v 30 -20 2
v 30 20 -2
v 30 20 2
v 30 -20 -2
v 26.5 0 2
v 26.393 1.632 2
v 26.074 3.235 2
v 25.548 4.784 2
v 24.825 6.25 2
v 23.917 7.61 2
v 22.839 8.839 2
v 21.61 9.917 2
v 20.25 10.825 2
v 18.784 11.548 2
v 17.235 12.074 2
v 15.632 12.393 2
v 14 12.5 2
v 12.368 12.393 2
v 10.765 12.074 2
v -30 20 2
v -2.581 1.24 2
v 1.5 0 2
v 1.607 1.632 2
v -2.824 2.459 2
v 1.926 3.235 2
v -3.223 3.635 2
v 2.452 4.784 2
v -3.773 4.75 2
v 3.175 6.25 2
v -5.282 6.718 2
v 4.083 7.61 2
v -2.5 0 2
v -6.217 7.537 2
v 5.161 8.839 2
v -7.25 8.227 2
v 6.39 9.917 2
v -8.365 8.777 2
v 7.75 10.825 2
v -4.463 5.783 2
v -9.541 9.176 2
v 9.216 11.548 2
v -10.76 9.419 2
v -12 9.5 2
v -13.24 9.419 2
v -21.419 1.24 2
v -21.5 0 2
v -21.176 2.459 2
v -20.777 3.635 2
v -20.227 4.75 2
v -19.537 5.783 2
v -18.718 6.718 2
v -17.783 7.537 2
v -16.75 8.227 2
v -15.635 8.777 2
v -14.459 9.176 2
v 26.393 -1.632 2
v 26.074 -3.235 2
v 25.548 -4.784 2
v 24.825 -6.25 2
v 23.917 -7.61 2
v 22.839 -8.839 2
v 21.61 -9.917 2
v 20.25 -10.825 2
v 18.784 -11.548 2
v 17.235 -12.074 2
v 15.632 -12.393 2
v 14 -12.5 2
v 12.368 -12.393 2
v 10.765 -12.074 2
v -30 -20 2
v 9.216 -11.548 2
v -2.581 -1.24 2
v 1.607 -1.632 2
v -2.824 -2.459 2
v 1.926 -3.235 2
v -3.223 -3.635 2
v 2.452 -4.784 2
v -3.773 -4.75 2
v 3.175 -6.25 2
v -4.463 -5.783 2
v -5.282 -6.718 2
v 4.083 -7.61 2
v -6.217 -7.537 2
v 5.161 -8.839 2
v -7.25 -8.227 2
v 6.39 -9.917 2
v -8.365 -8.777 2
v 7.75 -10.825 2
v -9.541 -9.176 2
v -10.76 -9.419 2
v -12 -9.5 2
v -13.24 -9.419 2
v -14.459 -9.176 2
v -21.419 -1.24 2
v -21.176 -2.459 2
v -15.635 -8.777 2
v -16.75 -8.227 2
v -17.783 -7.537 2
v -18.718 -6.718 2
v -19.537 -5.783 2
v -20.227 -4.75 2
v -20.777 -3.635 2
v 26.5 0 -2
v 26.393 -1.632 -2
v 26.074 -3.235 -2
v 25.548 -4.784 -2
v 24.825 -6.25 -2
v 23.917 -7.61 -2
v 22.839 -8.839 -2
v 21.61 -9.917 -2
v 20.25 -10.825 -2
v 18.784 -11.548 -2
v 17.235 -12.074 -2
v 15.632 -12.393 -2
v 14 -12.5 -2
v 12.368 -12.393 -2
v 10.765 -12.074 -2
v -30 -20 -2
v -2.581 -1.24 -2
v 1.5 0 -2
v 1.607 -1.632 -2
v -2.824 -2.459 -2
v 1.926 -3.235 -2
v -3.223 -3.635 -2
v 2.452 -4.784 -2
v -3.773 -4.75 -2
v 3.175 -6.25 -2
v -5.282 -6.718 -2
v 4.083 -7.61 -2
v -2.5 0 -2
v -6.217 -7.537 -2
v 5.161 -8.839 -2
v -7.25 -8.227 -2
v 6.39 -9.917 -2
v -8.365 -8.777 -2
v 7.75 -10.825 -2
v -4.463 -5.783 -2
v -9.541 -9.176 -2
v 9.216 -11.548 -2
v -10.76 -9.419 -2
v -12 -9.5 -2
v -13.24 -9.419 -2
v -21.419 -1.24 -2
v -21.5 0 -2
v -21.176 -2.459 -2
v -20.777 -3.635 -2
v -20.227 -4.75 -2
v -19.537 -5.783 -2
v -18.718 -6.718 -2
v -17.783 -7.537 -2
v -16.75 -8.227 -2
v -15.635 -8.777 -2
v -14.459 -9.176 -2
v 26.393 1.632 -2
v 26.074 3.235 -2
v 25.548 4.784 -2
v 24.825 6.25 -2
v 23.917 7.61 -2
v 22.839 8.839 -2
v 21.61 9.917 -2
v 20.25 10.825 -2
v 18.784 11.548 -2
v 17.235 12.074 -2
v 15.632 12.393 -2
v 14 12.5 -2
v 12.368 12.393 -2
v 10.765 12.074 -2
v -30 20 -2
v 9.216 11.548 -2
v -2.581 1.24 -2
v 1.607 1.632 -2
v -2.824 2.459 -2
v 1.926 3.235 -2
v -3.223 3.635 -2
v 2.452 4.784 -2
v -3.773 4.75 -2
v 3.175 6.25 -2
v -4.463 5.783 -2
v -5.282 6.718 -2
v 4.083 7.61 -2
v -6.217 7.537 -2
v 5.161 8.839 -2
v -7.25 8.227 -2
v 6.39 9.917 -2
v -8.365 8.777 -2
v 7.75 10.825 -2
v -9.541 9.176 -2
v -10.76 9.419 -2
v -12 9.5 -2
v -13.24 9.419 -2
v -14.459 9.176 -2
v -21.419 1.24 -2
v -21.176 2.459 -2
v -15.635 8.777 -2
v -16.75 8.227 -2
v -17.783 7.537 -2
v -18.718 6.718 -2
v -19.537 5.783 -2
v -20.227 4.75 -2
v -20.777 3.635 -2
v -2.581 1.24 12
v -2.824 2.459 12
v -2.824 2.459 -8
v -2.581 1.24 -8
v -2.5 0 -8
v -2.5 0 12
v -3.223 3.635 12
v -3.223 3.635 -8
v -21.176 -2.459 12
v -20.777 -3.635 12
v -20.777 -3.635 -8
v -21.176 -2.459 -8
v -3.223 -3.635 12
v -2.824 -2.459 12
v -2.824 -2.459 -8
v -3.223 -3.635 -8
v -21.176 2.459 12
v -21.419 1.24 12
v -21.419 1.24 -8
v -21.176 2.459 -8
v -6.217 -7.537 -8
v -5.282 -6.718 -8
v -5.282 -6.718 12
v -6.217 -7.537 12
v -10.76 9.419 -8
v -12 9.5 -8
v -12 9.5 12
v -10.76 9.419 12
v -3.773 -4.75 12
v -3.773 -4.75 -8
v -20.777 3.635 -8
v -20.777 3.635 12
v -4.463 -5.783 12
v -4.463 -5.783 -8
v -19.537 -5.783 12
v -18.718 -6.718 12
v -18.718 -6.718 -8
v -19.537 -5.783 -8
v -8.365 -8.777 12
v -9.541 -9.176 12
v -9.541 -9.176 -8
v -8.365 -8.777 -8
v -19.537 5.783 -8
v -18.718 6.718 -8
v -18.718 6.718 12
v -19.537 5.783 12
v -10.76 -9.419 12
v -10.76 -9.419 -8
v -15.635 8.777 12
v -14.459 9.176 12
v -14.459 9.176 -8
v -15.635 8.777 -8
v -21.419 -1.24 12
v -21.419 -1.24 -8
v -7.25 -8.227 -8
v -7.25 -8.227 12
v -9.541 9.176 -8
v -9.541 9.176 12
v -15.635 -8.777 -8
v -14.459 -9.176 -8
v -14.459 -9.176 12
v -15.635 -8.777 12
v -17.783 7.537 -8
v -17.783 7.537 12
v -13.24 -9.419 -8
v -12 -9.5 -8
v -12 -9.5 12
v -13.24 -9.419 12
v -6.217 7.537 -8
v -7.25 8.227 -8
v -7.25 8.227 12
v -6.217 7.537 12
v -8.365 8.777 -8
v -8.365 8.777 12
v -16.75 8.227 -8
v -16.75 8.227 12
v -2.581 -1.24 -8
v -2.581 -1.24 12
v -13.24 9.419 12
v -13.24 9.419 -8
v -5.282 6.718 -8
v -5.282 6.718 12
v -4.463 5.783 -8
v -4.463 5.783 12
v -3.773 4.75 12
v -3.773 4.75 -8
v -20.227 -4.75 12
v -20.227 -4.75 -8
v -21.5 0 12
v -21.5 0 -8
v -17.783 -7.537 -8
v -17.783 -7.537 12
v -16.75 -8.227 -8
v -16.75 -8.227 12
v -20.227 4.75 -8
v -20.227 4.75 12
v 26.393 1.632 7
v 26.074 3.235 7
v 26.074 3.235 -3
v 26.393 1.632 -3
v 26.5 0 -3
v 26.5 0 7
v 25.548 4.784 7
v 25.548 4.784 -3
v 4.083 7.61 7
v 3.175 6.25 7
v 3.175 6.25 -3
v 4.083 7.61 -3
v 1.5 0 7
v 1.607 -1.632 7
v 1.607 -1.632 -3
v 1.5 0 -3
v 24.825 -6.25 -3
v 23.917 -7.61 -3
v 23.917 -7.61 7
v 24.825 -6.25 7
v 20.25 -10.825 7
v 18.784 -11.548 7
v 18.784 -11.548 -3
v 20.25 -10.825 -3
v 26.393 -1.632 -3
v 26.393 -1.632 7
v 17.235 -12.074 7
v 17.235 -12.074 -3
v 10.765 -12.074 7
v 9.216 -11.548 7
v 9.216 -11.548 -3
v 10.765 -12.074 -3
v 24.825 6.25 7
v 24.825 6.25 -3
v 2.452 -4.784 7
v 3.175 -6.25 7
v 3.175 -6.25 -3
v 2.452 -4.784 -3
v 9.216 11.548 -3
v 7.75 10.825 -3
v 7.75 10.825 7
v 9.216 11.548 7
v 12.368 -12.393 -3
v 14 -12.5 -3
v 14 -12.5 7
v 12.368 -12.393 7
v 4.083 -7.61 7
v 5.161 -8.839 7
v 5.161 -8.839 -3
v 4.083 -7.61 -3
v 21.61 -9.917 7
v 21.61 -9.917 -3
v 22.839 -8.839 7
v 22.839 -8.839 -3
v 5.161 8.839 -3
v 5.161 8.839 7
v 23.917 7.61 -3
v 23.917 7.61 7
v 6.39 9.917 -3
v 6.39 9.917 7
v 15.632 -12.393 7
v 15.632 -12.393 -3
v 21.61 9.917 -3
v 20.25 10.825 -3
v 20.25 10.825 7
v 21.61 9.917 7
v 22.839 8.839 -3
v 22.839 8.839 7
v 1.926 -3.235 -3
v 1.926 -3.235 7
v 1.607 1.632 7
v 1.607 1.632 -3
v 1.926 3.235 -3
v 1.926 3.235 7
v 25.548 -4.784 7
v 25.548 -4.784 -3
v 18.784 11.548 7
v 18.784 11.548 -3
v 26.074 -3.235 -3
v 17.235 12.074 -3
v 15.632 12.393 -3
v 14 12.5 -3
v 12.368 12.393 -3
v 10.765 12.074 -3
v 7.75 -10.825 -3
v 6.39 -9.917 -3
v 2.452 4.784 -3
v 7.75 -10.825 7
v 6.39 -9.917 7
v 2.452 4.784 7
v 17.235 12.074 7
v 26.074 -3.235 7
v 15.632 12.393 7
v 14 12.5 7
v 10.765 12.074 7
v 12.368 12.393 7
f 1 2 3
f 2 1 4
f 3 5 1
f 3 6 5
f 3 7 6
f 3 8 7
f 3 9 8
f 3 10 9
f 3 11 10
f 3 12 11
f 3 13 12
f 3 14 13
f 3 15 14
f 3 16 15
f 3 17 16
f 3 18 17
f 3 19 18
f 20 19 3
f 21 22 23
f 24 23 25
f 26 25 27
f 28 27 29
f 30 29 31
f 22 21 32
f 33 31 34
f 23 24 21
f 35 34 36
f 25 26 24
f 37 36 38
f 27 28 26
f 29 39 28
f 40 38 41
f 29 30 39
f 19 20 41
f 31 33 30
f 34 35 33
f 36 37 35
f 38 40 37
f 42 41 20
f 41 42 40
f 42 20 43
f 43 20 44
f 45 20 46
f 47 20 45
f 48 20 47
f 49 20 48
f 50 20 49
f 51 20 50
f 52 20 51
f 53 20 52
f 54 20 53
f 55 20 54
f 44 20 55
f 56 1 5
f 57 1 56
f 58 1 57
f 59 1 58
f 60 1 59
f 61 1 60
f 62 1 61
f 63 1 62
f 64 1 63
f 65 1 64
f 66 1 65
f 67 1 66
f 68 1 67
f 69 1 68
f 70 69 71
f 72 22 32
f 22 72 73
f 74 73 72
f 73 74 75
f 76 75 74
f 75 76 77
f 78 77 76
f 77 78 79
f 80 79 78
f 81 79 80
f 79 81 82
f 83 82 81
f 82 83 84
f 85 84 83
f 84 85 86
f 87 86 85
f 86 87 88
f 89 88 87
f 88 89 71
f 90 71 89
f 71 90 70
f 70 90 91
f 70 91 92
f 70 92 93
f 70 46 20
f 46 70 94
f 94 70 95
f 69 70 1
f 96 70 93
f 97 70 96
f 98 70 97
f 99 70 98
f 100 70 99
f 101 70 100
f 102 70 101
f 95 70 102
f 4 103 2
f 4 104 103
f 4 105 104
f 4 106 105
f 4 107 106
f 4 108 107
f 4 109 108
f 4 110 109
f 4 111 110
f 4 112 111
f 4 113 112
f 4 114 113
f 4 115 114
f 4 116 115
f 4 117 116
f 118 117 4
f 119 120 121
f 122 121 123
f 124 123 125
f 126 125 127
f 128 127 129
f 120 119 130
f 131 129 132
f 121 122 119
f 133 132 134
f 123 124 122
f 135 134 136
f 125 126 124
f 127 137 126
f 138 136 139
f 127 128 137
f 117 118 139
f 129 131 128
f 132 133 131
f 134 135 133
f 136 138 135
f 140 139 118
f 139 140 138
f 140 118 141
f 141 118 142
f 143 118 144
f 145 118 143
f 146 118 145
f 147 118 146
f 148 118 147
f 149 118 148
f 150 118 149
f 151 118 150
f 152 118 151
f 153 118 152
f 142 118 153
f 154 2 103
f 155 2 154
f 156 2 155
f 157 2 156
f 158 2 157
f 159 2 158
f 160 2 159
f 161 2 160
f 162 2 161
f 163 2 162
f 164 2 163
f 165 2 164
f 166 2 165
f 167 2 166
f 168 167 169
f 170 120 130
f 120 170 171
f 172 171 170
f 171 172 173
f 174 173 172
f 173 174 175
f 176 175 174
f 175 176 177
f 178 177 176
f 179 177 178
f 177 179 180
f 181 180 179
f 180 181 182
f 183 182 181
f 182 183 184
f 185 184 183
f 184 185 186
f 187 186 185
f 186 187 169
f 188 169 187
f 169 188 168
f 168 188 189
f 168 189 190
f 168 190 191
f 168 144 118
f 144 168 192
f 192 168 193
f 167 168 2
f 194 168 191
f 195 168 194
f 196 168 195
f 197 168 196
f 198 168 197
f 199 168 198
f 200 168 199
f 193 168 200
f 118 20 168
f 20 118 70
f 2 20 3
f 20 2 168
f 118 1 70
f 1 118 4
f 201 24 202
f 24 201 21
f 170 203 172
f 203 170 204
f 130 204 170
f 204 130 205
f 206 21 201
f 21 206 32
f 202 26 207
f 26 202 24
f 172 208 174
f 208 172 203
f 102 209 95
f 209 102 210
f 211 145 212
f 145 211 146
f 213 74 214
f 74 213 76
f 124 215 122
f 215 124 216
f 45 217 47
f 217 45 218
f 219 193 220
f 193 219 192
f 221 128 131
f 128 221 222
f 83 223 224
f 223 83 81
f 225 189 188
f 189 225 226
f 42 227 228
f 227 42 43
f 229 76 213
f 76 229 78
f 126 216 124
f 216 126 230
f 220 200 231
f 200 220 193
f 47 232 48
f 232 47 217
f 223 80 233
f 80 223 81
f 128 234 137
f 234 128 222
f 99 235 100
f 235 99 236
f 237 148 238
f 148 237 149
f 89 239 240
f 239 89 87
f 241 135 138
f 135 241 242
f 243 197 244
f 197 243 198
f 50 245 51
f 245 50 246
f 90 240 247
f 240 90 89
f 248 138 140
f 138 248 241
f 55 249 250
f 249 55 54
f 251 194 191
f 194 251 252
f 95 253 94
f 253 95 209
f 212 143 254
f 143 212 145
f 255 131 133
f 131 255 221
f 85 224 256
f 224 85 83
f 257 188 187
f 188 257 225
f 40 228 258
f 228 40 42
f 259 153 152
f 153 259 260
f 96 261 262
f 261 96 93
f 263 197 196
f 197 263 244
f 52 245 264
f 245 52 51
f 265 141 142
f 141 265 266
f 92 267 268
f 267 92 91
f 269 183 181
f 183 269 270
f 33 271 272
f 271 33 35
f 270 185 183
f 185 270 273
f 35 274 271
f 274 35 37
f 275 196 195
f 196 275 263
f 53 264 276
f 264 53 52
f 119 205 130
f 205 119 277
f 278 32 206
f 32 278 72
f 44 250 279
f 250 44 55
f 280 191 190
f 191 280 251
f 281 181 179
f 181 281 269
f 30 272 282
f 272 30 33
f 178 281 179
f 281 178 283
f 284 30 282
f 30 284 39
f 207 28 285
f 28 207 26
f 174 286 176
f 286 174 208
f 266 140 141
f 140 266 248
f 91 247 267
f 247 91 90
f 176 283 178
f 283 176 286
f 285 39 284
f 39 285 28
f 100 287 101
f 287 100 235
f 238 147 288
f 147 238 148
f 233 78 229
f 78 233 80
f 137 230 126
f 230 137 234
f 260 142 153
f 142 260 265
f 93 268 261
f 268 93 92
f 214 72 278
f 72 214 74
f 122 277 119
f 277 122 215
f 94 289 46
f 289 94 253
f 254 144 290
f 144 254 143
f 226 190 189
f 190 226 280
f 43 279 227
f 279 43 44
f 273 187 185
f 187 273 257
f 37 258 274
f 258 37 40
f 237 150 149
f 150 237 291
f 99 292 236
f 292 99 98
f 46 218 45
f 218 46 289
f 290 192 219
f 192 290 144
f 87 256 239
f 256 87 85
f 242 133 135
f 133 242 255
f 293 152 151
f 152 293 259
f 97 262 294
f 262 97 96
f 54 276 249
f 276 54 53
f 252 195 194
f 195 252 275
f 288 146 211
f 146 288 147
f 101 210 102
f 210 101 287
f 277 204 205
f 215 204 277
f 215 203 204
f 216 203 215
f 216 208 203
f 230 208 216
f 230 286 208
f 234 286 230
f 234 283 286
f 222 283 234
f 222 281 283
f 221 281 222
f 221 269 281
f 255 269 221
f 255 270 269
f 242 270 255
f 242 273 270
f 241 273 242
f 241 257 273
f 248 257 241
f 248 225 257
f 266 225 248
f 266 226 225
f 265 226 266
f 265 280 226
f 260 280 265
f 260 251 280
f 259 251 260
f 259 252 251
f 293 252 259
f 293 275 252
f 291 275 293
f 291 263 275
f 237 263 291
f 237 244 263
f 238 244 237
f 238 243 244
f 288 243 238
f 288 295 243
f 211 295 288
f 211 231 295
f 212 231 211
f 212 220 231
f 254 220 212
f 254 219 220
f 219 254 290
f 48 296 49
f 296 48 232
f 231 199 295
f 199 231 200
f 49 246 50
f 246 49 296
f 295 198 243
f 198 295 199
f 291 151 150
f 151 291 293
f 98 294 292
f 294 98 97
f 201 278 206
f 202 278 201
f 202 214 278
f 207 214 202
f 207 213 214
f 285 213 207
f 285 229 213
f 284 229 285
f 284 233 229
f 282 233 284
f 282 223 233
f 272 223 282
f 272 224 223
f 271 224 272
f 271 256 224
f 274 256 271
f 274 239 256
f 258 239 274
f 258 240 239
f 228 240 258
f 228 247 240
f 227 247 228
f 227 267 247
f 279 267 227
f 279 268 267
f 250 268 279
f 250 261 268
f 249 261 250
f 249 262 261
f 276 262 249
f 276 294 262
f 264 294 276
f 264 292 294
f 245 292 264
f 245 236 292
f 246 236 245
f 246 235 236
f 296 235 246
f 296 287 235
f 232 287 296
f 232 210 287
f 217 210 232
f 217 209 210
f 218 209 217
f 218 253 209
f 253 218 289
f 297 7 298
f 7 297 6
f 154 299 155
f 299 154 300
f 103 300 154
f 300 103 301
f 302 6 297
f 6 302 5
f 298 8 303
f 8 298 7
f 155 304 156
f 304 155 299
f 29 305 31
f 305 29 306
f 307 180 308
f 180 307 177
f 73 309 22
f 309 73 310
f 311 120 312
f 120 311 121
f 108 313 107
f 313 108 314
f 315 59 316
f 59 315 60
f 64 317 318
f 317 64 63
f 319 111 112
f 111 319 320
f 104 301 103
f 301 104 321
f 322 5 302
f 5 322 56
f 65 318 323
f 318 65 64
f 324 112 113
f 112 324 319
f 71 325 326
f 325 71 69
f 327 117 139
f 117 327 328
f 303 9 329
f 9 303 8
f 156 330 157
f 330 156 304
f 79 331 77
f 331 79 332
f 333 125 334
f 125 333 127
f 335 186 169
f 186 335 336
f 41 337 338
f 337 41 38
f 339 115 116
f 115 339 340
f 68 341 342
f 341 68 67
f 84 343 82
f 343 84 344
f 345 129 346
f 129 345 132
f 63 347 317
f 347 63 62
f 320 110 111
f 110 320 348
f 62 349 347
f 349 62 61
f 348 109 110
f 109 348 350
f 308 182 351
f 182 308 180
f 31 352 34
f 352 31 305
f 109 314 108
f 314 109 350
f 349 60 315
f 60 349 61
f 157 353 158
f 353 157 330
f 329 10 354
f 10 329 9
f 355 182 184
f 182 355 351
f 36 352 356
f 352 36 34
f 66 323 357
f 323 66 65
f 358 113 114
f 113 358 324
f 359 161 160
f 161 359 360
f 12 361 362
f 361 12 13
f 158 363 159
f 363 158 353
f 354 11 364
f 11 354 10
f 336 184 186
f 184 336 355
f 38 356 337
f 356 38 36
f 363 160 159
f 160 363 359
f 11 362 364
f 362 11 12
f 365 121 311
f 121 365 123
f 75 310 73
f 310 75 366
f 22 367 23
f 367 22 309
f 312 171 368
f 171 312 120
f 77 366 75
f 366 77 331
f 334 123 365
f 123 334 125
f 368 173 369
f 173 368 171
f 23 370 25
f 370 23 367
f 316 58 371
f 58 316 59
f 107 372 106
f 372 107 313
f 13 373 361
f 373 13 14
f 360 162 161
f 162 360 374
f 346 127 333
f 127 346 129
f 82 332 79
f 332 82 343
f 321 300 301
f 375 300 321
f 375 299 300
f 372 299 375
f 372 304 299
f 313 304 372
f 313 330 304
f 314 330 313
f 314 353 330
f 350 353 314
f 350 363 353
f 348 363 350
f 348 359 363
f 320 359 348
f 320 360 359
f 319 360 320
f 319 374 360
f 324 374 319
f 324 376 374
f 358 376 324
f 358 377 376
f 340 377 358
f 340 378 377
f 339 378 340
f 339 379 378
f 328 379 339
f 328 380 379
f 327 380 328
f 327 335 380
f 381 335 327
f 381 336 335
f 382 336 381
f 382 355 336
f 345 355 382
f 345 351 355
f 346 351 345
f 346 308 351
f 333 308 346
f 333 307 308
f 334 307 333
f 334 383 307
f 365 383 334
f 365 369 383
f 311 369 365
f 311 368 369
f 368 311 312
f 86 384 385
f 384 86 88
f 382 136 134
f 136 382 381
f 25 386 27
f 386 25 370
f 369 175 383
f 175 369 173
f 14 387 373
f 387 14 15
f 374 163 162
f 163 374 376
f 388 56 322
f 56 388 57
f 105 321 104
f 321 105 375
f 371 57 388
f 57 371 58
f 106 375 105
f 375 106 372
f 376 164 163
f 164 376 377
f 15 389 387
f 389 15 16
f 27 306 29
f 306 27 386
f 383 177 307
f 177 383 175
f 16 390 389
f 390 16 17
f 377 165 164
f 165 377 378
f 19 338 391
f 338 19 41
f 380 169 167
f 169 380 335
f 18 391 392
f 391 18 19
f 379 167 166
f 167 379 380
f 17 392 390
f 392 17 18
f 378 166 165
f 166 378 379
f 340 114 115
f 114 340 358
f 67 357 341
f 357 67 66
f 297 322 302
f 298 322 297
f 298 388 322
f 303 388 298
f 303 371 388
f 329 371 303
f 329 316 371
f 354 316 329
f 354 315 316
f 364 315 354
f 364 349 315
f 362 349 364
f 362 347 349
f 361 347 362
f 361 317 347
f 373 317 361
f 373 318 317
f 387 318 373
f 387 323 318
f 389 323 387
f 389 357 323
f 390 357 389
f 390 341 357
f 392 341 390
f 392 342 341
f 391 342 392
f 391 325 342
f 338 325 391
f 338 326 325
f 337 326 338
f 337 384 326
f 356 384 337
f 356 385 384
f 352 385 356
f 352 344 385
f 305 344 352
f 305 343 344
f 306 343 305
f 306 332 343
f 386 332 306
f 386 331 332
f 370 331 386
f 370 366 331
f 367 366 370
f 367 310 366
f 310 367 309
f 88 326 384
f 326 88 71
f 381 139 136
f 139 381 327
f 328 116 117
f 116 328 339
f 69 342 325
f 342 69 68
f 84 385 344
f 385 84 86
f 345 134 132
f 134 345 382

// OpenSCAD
// Parametric weed detection probe mount for the garden-automation robot.
// Holds a downward-facing optical sensor + an ultrasonic height probe.
// Issue #76 task: Rilevamento erbacce.
// Print in PLA or PETG, 50% infill; mount sensor face-down toward the canopy.

// Parameters (mm)
mount_plate_l = 60;       // mount plate length
mount_plate_w = 40;      // mount plate width
mount_plate_h = 4;       // mount plate thickness
sensor_dia = 16;          // optical vision sensor OD (e.g. OV2640 module)
sensor_depth = 20;        // how deep the sensor sits in the mount
sonar_dia = 22;           // ultrasonic sensor (HC-SR04) canister OD
sonar_depth = 10;         // ultrasonic sensor embed depth
bolt_dia = 3.4;           // M3 mounting bolts
bolt_circle = 48;        // bolt circle for chassis mount

$fn = 48;

module weed_probe() {
  difference() {
    // base mount plate
    cube([mount_plate_l, mount_plate_w, mount_plate_h], center = true);
    // optical sensor bore
    translate([-12, 0, 0])
      cylinder(h = mount_plate_h + 2, d = sensor_dia, center = true);
    // ultrasonic sensor bore
    translate([14, 0, 0])
      cylinder(h = mount_plate_h + 2, d = sonar_dia, center = true);
    // chassis mount bolt holes
    for (sx = [-1, 1], sy = [-1, 1]) {
      translate([sx * bolt_circle / 2, sy * bolt_circle / 2, 0])
        cylinder(h = mount_plate_h + 2, d = bolt_dia, $fn = 20);
    }
  }
  // sensor retention sleeves
  translate([-12, 0, -sensor_depth / 2 + mount_plate_h / 2])
    cylinder(h = sensor_depth, d = sensor_dia + 3);
  translate([14, 0, -sonar_depth / 2 + mount_plate_h / 2])
    cylinder(h = sonar_depth, d = sonar_dia + 3);
}

weed_probe();
// Point the optical sensor at the canopy; the sonar reads plant height for the classifier.
